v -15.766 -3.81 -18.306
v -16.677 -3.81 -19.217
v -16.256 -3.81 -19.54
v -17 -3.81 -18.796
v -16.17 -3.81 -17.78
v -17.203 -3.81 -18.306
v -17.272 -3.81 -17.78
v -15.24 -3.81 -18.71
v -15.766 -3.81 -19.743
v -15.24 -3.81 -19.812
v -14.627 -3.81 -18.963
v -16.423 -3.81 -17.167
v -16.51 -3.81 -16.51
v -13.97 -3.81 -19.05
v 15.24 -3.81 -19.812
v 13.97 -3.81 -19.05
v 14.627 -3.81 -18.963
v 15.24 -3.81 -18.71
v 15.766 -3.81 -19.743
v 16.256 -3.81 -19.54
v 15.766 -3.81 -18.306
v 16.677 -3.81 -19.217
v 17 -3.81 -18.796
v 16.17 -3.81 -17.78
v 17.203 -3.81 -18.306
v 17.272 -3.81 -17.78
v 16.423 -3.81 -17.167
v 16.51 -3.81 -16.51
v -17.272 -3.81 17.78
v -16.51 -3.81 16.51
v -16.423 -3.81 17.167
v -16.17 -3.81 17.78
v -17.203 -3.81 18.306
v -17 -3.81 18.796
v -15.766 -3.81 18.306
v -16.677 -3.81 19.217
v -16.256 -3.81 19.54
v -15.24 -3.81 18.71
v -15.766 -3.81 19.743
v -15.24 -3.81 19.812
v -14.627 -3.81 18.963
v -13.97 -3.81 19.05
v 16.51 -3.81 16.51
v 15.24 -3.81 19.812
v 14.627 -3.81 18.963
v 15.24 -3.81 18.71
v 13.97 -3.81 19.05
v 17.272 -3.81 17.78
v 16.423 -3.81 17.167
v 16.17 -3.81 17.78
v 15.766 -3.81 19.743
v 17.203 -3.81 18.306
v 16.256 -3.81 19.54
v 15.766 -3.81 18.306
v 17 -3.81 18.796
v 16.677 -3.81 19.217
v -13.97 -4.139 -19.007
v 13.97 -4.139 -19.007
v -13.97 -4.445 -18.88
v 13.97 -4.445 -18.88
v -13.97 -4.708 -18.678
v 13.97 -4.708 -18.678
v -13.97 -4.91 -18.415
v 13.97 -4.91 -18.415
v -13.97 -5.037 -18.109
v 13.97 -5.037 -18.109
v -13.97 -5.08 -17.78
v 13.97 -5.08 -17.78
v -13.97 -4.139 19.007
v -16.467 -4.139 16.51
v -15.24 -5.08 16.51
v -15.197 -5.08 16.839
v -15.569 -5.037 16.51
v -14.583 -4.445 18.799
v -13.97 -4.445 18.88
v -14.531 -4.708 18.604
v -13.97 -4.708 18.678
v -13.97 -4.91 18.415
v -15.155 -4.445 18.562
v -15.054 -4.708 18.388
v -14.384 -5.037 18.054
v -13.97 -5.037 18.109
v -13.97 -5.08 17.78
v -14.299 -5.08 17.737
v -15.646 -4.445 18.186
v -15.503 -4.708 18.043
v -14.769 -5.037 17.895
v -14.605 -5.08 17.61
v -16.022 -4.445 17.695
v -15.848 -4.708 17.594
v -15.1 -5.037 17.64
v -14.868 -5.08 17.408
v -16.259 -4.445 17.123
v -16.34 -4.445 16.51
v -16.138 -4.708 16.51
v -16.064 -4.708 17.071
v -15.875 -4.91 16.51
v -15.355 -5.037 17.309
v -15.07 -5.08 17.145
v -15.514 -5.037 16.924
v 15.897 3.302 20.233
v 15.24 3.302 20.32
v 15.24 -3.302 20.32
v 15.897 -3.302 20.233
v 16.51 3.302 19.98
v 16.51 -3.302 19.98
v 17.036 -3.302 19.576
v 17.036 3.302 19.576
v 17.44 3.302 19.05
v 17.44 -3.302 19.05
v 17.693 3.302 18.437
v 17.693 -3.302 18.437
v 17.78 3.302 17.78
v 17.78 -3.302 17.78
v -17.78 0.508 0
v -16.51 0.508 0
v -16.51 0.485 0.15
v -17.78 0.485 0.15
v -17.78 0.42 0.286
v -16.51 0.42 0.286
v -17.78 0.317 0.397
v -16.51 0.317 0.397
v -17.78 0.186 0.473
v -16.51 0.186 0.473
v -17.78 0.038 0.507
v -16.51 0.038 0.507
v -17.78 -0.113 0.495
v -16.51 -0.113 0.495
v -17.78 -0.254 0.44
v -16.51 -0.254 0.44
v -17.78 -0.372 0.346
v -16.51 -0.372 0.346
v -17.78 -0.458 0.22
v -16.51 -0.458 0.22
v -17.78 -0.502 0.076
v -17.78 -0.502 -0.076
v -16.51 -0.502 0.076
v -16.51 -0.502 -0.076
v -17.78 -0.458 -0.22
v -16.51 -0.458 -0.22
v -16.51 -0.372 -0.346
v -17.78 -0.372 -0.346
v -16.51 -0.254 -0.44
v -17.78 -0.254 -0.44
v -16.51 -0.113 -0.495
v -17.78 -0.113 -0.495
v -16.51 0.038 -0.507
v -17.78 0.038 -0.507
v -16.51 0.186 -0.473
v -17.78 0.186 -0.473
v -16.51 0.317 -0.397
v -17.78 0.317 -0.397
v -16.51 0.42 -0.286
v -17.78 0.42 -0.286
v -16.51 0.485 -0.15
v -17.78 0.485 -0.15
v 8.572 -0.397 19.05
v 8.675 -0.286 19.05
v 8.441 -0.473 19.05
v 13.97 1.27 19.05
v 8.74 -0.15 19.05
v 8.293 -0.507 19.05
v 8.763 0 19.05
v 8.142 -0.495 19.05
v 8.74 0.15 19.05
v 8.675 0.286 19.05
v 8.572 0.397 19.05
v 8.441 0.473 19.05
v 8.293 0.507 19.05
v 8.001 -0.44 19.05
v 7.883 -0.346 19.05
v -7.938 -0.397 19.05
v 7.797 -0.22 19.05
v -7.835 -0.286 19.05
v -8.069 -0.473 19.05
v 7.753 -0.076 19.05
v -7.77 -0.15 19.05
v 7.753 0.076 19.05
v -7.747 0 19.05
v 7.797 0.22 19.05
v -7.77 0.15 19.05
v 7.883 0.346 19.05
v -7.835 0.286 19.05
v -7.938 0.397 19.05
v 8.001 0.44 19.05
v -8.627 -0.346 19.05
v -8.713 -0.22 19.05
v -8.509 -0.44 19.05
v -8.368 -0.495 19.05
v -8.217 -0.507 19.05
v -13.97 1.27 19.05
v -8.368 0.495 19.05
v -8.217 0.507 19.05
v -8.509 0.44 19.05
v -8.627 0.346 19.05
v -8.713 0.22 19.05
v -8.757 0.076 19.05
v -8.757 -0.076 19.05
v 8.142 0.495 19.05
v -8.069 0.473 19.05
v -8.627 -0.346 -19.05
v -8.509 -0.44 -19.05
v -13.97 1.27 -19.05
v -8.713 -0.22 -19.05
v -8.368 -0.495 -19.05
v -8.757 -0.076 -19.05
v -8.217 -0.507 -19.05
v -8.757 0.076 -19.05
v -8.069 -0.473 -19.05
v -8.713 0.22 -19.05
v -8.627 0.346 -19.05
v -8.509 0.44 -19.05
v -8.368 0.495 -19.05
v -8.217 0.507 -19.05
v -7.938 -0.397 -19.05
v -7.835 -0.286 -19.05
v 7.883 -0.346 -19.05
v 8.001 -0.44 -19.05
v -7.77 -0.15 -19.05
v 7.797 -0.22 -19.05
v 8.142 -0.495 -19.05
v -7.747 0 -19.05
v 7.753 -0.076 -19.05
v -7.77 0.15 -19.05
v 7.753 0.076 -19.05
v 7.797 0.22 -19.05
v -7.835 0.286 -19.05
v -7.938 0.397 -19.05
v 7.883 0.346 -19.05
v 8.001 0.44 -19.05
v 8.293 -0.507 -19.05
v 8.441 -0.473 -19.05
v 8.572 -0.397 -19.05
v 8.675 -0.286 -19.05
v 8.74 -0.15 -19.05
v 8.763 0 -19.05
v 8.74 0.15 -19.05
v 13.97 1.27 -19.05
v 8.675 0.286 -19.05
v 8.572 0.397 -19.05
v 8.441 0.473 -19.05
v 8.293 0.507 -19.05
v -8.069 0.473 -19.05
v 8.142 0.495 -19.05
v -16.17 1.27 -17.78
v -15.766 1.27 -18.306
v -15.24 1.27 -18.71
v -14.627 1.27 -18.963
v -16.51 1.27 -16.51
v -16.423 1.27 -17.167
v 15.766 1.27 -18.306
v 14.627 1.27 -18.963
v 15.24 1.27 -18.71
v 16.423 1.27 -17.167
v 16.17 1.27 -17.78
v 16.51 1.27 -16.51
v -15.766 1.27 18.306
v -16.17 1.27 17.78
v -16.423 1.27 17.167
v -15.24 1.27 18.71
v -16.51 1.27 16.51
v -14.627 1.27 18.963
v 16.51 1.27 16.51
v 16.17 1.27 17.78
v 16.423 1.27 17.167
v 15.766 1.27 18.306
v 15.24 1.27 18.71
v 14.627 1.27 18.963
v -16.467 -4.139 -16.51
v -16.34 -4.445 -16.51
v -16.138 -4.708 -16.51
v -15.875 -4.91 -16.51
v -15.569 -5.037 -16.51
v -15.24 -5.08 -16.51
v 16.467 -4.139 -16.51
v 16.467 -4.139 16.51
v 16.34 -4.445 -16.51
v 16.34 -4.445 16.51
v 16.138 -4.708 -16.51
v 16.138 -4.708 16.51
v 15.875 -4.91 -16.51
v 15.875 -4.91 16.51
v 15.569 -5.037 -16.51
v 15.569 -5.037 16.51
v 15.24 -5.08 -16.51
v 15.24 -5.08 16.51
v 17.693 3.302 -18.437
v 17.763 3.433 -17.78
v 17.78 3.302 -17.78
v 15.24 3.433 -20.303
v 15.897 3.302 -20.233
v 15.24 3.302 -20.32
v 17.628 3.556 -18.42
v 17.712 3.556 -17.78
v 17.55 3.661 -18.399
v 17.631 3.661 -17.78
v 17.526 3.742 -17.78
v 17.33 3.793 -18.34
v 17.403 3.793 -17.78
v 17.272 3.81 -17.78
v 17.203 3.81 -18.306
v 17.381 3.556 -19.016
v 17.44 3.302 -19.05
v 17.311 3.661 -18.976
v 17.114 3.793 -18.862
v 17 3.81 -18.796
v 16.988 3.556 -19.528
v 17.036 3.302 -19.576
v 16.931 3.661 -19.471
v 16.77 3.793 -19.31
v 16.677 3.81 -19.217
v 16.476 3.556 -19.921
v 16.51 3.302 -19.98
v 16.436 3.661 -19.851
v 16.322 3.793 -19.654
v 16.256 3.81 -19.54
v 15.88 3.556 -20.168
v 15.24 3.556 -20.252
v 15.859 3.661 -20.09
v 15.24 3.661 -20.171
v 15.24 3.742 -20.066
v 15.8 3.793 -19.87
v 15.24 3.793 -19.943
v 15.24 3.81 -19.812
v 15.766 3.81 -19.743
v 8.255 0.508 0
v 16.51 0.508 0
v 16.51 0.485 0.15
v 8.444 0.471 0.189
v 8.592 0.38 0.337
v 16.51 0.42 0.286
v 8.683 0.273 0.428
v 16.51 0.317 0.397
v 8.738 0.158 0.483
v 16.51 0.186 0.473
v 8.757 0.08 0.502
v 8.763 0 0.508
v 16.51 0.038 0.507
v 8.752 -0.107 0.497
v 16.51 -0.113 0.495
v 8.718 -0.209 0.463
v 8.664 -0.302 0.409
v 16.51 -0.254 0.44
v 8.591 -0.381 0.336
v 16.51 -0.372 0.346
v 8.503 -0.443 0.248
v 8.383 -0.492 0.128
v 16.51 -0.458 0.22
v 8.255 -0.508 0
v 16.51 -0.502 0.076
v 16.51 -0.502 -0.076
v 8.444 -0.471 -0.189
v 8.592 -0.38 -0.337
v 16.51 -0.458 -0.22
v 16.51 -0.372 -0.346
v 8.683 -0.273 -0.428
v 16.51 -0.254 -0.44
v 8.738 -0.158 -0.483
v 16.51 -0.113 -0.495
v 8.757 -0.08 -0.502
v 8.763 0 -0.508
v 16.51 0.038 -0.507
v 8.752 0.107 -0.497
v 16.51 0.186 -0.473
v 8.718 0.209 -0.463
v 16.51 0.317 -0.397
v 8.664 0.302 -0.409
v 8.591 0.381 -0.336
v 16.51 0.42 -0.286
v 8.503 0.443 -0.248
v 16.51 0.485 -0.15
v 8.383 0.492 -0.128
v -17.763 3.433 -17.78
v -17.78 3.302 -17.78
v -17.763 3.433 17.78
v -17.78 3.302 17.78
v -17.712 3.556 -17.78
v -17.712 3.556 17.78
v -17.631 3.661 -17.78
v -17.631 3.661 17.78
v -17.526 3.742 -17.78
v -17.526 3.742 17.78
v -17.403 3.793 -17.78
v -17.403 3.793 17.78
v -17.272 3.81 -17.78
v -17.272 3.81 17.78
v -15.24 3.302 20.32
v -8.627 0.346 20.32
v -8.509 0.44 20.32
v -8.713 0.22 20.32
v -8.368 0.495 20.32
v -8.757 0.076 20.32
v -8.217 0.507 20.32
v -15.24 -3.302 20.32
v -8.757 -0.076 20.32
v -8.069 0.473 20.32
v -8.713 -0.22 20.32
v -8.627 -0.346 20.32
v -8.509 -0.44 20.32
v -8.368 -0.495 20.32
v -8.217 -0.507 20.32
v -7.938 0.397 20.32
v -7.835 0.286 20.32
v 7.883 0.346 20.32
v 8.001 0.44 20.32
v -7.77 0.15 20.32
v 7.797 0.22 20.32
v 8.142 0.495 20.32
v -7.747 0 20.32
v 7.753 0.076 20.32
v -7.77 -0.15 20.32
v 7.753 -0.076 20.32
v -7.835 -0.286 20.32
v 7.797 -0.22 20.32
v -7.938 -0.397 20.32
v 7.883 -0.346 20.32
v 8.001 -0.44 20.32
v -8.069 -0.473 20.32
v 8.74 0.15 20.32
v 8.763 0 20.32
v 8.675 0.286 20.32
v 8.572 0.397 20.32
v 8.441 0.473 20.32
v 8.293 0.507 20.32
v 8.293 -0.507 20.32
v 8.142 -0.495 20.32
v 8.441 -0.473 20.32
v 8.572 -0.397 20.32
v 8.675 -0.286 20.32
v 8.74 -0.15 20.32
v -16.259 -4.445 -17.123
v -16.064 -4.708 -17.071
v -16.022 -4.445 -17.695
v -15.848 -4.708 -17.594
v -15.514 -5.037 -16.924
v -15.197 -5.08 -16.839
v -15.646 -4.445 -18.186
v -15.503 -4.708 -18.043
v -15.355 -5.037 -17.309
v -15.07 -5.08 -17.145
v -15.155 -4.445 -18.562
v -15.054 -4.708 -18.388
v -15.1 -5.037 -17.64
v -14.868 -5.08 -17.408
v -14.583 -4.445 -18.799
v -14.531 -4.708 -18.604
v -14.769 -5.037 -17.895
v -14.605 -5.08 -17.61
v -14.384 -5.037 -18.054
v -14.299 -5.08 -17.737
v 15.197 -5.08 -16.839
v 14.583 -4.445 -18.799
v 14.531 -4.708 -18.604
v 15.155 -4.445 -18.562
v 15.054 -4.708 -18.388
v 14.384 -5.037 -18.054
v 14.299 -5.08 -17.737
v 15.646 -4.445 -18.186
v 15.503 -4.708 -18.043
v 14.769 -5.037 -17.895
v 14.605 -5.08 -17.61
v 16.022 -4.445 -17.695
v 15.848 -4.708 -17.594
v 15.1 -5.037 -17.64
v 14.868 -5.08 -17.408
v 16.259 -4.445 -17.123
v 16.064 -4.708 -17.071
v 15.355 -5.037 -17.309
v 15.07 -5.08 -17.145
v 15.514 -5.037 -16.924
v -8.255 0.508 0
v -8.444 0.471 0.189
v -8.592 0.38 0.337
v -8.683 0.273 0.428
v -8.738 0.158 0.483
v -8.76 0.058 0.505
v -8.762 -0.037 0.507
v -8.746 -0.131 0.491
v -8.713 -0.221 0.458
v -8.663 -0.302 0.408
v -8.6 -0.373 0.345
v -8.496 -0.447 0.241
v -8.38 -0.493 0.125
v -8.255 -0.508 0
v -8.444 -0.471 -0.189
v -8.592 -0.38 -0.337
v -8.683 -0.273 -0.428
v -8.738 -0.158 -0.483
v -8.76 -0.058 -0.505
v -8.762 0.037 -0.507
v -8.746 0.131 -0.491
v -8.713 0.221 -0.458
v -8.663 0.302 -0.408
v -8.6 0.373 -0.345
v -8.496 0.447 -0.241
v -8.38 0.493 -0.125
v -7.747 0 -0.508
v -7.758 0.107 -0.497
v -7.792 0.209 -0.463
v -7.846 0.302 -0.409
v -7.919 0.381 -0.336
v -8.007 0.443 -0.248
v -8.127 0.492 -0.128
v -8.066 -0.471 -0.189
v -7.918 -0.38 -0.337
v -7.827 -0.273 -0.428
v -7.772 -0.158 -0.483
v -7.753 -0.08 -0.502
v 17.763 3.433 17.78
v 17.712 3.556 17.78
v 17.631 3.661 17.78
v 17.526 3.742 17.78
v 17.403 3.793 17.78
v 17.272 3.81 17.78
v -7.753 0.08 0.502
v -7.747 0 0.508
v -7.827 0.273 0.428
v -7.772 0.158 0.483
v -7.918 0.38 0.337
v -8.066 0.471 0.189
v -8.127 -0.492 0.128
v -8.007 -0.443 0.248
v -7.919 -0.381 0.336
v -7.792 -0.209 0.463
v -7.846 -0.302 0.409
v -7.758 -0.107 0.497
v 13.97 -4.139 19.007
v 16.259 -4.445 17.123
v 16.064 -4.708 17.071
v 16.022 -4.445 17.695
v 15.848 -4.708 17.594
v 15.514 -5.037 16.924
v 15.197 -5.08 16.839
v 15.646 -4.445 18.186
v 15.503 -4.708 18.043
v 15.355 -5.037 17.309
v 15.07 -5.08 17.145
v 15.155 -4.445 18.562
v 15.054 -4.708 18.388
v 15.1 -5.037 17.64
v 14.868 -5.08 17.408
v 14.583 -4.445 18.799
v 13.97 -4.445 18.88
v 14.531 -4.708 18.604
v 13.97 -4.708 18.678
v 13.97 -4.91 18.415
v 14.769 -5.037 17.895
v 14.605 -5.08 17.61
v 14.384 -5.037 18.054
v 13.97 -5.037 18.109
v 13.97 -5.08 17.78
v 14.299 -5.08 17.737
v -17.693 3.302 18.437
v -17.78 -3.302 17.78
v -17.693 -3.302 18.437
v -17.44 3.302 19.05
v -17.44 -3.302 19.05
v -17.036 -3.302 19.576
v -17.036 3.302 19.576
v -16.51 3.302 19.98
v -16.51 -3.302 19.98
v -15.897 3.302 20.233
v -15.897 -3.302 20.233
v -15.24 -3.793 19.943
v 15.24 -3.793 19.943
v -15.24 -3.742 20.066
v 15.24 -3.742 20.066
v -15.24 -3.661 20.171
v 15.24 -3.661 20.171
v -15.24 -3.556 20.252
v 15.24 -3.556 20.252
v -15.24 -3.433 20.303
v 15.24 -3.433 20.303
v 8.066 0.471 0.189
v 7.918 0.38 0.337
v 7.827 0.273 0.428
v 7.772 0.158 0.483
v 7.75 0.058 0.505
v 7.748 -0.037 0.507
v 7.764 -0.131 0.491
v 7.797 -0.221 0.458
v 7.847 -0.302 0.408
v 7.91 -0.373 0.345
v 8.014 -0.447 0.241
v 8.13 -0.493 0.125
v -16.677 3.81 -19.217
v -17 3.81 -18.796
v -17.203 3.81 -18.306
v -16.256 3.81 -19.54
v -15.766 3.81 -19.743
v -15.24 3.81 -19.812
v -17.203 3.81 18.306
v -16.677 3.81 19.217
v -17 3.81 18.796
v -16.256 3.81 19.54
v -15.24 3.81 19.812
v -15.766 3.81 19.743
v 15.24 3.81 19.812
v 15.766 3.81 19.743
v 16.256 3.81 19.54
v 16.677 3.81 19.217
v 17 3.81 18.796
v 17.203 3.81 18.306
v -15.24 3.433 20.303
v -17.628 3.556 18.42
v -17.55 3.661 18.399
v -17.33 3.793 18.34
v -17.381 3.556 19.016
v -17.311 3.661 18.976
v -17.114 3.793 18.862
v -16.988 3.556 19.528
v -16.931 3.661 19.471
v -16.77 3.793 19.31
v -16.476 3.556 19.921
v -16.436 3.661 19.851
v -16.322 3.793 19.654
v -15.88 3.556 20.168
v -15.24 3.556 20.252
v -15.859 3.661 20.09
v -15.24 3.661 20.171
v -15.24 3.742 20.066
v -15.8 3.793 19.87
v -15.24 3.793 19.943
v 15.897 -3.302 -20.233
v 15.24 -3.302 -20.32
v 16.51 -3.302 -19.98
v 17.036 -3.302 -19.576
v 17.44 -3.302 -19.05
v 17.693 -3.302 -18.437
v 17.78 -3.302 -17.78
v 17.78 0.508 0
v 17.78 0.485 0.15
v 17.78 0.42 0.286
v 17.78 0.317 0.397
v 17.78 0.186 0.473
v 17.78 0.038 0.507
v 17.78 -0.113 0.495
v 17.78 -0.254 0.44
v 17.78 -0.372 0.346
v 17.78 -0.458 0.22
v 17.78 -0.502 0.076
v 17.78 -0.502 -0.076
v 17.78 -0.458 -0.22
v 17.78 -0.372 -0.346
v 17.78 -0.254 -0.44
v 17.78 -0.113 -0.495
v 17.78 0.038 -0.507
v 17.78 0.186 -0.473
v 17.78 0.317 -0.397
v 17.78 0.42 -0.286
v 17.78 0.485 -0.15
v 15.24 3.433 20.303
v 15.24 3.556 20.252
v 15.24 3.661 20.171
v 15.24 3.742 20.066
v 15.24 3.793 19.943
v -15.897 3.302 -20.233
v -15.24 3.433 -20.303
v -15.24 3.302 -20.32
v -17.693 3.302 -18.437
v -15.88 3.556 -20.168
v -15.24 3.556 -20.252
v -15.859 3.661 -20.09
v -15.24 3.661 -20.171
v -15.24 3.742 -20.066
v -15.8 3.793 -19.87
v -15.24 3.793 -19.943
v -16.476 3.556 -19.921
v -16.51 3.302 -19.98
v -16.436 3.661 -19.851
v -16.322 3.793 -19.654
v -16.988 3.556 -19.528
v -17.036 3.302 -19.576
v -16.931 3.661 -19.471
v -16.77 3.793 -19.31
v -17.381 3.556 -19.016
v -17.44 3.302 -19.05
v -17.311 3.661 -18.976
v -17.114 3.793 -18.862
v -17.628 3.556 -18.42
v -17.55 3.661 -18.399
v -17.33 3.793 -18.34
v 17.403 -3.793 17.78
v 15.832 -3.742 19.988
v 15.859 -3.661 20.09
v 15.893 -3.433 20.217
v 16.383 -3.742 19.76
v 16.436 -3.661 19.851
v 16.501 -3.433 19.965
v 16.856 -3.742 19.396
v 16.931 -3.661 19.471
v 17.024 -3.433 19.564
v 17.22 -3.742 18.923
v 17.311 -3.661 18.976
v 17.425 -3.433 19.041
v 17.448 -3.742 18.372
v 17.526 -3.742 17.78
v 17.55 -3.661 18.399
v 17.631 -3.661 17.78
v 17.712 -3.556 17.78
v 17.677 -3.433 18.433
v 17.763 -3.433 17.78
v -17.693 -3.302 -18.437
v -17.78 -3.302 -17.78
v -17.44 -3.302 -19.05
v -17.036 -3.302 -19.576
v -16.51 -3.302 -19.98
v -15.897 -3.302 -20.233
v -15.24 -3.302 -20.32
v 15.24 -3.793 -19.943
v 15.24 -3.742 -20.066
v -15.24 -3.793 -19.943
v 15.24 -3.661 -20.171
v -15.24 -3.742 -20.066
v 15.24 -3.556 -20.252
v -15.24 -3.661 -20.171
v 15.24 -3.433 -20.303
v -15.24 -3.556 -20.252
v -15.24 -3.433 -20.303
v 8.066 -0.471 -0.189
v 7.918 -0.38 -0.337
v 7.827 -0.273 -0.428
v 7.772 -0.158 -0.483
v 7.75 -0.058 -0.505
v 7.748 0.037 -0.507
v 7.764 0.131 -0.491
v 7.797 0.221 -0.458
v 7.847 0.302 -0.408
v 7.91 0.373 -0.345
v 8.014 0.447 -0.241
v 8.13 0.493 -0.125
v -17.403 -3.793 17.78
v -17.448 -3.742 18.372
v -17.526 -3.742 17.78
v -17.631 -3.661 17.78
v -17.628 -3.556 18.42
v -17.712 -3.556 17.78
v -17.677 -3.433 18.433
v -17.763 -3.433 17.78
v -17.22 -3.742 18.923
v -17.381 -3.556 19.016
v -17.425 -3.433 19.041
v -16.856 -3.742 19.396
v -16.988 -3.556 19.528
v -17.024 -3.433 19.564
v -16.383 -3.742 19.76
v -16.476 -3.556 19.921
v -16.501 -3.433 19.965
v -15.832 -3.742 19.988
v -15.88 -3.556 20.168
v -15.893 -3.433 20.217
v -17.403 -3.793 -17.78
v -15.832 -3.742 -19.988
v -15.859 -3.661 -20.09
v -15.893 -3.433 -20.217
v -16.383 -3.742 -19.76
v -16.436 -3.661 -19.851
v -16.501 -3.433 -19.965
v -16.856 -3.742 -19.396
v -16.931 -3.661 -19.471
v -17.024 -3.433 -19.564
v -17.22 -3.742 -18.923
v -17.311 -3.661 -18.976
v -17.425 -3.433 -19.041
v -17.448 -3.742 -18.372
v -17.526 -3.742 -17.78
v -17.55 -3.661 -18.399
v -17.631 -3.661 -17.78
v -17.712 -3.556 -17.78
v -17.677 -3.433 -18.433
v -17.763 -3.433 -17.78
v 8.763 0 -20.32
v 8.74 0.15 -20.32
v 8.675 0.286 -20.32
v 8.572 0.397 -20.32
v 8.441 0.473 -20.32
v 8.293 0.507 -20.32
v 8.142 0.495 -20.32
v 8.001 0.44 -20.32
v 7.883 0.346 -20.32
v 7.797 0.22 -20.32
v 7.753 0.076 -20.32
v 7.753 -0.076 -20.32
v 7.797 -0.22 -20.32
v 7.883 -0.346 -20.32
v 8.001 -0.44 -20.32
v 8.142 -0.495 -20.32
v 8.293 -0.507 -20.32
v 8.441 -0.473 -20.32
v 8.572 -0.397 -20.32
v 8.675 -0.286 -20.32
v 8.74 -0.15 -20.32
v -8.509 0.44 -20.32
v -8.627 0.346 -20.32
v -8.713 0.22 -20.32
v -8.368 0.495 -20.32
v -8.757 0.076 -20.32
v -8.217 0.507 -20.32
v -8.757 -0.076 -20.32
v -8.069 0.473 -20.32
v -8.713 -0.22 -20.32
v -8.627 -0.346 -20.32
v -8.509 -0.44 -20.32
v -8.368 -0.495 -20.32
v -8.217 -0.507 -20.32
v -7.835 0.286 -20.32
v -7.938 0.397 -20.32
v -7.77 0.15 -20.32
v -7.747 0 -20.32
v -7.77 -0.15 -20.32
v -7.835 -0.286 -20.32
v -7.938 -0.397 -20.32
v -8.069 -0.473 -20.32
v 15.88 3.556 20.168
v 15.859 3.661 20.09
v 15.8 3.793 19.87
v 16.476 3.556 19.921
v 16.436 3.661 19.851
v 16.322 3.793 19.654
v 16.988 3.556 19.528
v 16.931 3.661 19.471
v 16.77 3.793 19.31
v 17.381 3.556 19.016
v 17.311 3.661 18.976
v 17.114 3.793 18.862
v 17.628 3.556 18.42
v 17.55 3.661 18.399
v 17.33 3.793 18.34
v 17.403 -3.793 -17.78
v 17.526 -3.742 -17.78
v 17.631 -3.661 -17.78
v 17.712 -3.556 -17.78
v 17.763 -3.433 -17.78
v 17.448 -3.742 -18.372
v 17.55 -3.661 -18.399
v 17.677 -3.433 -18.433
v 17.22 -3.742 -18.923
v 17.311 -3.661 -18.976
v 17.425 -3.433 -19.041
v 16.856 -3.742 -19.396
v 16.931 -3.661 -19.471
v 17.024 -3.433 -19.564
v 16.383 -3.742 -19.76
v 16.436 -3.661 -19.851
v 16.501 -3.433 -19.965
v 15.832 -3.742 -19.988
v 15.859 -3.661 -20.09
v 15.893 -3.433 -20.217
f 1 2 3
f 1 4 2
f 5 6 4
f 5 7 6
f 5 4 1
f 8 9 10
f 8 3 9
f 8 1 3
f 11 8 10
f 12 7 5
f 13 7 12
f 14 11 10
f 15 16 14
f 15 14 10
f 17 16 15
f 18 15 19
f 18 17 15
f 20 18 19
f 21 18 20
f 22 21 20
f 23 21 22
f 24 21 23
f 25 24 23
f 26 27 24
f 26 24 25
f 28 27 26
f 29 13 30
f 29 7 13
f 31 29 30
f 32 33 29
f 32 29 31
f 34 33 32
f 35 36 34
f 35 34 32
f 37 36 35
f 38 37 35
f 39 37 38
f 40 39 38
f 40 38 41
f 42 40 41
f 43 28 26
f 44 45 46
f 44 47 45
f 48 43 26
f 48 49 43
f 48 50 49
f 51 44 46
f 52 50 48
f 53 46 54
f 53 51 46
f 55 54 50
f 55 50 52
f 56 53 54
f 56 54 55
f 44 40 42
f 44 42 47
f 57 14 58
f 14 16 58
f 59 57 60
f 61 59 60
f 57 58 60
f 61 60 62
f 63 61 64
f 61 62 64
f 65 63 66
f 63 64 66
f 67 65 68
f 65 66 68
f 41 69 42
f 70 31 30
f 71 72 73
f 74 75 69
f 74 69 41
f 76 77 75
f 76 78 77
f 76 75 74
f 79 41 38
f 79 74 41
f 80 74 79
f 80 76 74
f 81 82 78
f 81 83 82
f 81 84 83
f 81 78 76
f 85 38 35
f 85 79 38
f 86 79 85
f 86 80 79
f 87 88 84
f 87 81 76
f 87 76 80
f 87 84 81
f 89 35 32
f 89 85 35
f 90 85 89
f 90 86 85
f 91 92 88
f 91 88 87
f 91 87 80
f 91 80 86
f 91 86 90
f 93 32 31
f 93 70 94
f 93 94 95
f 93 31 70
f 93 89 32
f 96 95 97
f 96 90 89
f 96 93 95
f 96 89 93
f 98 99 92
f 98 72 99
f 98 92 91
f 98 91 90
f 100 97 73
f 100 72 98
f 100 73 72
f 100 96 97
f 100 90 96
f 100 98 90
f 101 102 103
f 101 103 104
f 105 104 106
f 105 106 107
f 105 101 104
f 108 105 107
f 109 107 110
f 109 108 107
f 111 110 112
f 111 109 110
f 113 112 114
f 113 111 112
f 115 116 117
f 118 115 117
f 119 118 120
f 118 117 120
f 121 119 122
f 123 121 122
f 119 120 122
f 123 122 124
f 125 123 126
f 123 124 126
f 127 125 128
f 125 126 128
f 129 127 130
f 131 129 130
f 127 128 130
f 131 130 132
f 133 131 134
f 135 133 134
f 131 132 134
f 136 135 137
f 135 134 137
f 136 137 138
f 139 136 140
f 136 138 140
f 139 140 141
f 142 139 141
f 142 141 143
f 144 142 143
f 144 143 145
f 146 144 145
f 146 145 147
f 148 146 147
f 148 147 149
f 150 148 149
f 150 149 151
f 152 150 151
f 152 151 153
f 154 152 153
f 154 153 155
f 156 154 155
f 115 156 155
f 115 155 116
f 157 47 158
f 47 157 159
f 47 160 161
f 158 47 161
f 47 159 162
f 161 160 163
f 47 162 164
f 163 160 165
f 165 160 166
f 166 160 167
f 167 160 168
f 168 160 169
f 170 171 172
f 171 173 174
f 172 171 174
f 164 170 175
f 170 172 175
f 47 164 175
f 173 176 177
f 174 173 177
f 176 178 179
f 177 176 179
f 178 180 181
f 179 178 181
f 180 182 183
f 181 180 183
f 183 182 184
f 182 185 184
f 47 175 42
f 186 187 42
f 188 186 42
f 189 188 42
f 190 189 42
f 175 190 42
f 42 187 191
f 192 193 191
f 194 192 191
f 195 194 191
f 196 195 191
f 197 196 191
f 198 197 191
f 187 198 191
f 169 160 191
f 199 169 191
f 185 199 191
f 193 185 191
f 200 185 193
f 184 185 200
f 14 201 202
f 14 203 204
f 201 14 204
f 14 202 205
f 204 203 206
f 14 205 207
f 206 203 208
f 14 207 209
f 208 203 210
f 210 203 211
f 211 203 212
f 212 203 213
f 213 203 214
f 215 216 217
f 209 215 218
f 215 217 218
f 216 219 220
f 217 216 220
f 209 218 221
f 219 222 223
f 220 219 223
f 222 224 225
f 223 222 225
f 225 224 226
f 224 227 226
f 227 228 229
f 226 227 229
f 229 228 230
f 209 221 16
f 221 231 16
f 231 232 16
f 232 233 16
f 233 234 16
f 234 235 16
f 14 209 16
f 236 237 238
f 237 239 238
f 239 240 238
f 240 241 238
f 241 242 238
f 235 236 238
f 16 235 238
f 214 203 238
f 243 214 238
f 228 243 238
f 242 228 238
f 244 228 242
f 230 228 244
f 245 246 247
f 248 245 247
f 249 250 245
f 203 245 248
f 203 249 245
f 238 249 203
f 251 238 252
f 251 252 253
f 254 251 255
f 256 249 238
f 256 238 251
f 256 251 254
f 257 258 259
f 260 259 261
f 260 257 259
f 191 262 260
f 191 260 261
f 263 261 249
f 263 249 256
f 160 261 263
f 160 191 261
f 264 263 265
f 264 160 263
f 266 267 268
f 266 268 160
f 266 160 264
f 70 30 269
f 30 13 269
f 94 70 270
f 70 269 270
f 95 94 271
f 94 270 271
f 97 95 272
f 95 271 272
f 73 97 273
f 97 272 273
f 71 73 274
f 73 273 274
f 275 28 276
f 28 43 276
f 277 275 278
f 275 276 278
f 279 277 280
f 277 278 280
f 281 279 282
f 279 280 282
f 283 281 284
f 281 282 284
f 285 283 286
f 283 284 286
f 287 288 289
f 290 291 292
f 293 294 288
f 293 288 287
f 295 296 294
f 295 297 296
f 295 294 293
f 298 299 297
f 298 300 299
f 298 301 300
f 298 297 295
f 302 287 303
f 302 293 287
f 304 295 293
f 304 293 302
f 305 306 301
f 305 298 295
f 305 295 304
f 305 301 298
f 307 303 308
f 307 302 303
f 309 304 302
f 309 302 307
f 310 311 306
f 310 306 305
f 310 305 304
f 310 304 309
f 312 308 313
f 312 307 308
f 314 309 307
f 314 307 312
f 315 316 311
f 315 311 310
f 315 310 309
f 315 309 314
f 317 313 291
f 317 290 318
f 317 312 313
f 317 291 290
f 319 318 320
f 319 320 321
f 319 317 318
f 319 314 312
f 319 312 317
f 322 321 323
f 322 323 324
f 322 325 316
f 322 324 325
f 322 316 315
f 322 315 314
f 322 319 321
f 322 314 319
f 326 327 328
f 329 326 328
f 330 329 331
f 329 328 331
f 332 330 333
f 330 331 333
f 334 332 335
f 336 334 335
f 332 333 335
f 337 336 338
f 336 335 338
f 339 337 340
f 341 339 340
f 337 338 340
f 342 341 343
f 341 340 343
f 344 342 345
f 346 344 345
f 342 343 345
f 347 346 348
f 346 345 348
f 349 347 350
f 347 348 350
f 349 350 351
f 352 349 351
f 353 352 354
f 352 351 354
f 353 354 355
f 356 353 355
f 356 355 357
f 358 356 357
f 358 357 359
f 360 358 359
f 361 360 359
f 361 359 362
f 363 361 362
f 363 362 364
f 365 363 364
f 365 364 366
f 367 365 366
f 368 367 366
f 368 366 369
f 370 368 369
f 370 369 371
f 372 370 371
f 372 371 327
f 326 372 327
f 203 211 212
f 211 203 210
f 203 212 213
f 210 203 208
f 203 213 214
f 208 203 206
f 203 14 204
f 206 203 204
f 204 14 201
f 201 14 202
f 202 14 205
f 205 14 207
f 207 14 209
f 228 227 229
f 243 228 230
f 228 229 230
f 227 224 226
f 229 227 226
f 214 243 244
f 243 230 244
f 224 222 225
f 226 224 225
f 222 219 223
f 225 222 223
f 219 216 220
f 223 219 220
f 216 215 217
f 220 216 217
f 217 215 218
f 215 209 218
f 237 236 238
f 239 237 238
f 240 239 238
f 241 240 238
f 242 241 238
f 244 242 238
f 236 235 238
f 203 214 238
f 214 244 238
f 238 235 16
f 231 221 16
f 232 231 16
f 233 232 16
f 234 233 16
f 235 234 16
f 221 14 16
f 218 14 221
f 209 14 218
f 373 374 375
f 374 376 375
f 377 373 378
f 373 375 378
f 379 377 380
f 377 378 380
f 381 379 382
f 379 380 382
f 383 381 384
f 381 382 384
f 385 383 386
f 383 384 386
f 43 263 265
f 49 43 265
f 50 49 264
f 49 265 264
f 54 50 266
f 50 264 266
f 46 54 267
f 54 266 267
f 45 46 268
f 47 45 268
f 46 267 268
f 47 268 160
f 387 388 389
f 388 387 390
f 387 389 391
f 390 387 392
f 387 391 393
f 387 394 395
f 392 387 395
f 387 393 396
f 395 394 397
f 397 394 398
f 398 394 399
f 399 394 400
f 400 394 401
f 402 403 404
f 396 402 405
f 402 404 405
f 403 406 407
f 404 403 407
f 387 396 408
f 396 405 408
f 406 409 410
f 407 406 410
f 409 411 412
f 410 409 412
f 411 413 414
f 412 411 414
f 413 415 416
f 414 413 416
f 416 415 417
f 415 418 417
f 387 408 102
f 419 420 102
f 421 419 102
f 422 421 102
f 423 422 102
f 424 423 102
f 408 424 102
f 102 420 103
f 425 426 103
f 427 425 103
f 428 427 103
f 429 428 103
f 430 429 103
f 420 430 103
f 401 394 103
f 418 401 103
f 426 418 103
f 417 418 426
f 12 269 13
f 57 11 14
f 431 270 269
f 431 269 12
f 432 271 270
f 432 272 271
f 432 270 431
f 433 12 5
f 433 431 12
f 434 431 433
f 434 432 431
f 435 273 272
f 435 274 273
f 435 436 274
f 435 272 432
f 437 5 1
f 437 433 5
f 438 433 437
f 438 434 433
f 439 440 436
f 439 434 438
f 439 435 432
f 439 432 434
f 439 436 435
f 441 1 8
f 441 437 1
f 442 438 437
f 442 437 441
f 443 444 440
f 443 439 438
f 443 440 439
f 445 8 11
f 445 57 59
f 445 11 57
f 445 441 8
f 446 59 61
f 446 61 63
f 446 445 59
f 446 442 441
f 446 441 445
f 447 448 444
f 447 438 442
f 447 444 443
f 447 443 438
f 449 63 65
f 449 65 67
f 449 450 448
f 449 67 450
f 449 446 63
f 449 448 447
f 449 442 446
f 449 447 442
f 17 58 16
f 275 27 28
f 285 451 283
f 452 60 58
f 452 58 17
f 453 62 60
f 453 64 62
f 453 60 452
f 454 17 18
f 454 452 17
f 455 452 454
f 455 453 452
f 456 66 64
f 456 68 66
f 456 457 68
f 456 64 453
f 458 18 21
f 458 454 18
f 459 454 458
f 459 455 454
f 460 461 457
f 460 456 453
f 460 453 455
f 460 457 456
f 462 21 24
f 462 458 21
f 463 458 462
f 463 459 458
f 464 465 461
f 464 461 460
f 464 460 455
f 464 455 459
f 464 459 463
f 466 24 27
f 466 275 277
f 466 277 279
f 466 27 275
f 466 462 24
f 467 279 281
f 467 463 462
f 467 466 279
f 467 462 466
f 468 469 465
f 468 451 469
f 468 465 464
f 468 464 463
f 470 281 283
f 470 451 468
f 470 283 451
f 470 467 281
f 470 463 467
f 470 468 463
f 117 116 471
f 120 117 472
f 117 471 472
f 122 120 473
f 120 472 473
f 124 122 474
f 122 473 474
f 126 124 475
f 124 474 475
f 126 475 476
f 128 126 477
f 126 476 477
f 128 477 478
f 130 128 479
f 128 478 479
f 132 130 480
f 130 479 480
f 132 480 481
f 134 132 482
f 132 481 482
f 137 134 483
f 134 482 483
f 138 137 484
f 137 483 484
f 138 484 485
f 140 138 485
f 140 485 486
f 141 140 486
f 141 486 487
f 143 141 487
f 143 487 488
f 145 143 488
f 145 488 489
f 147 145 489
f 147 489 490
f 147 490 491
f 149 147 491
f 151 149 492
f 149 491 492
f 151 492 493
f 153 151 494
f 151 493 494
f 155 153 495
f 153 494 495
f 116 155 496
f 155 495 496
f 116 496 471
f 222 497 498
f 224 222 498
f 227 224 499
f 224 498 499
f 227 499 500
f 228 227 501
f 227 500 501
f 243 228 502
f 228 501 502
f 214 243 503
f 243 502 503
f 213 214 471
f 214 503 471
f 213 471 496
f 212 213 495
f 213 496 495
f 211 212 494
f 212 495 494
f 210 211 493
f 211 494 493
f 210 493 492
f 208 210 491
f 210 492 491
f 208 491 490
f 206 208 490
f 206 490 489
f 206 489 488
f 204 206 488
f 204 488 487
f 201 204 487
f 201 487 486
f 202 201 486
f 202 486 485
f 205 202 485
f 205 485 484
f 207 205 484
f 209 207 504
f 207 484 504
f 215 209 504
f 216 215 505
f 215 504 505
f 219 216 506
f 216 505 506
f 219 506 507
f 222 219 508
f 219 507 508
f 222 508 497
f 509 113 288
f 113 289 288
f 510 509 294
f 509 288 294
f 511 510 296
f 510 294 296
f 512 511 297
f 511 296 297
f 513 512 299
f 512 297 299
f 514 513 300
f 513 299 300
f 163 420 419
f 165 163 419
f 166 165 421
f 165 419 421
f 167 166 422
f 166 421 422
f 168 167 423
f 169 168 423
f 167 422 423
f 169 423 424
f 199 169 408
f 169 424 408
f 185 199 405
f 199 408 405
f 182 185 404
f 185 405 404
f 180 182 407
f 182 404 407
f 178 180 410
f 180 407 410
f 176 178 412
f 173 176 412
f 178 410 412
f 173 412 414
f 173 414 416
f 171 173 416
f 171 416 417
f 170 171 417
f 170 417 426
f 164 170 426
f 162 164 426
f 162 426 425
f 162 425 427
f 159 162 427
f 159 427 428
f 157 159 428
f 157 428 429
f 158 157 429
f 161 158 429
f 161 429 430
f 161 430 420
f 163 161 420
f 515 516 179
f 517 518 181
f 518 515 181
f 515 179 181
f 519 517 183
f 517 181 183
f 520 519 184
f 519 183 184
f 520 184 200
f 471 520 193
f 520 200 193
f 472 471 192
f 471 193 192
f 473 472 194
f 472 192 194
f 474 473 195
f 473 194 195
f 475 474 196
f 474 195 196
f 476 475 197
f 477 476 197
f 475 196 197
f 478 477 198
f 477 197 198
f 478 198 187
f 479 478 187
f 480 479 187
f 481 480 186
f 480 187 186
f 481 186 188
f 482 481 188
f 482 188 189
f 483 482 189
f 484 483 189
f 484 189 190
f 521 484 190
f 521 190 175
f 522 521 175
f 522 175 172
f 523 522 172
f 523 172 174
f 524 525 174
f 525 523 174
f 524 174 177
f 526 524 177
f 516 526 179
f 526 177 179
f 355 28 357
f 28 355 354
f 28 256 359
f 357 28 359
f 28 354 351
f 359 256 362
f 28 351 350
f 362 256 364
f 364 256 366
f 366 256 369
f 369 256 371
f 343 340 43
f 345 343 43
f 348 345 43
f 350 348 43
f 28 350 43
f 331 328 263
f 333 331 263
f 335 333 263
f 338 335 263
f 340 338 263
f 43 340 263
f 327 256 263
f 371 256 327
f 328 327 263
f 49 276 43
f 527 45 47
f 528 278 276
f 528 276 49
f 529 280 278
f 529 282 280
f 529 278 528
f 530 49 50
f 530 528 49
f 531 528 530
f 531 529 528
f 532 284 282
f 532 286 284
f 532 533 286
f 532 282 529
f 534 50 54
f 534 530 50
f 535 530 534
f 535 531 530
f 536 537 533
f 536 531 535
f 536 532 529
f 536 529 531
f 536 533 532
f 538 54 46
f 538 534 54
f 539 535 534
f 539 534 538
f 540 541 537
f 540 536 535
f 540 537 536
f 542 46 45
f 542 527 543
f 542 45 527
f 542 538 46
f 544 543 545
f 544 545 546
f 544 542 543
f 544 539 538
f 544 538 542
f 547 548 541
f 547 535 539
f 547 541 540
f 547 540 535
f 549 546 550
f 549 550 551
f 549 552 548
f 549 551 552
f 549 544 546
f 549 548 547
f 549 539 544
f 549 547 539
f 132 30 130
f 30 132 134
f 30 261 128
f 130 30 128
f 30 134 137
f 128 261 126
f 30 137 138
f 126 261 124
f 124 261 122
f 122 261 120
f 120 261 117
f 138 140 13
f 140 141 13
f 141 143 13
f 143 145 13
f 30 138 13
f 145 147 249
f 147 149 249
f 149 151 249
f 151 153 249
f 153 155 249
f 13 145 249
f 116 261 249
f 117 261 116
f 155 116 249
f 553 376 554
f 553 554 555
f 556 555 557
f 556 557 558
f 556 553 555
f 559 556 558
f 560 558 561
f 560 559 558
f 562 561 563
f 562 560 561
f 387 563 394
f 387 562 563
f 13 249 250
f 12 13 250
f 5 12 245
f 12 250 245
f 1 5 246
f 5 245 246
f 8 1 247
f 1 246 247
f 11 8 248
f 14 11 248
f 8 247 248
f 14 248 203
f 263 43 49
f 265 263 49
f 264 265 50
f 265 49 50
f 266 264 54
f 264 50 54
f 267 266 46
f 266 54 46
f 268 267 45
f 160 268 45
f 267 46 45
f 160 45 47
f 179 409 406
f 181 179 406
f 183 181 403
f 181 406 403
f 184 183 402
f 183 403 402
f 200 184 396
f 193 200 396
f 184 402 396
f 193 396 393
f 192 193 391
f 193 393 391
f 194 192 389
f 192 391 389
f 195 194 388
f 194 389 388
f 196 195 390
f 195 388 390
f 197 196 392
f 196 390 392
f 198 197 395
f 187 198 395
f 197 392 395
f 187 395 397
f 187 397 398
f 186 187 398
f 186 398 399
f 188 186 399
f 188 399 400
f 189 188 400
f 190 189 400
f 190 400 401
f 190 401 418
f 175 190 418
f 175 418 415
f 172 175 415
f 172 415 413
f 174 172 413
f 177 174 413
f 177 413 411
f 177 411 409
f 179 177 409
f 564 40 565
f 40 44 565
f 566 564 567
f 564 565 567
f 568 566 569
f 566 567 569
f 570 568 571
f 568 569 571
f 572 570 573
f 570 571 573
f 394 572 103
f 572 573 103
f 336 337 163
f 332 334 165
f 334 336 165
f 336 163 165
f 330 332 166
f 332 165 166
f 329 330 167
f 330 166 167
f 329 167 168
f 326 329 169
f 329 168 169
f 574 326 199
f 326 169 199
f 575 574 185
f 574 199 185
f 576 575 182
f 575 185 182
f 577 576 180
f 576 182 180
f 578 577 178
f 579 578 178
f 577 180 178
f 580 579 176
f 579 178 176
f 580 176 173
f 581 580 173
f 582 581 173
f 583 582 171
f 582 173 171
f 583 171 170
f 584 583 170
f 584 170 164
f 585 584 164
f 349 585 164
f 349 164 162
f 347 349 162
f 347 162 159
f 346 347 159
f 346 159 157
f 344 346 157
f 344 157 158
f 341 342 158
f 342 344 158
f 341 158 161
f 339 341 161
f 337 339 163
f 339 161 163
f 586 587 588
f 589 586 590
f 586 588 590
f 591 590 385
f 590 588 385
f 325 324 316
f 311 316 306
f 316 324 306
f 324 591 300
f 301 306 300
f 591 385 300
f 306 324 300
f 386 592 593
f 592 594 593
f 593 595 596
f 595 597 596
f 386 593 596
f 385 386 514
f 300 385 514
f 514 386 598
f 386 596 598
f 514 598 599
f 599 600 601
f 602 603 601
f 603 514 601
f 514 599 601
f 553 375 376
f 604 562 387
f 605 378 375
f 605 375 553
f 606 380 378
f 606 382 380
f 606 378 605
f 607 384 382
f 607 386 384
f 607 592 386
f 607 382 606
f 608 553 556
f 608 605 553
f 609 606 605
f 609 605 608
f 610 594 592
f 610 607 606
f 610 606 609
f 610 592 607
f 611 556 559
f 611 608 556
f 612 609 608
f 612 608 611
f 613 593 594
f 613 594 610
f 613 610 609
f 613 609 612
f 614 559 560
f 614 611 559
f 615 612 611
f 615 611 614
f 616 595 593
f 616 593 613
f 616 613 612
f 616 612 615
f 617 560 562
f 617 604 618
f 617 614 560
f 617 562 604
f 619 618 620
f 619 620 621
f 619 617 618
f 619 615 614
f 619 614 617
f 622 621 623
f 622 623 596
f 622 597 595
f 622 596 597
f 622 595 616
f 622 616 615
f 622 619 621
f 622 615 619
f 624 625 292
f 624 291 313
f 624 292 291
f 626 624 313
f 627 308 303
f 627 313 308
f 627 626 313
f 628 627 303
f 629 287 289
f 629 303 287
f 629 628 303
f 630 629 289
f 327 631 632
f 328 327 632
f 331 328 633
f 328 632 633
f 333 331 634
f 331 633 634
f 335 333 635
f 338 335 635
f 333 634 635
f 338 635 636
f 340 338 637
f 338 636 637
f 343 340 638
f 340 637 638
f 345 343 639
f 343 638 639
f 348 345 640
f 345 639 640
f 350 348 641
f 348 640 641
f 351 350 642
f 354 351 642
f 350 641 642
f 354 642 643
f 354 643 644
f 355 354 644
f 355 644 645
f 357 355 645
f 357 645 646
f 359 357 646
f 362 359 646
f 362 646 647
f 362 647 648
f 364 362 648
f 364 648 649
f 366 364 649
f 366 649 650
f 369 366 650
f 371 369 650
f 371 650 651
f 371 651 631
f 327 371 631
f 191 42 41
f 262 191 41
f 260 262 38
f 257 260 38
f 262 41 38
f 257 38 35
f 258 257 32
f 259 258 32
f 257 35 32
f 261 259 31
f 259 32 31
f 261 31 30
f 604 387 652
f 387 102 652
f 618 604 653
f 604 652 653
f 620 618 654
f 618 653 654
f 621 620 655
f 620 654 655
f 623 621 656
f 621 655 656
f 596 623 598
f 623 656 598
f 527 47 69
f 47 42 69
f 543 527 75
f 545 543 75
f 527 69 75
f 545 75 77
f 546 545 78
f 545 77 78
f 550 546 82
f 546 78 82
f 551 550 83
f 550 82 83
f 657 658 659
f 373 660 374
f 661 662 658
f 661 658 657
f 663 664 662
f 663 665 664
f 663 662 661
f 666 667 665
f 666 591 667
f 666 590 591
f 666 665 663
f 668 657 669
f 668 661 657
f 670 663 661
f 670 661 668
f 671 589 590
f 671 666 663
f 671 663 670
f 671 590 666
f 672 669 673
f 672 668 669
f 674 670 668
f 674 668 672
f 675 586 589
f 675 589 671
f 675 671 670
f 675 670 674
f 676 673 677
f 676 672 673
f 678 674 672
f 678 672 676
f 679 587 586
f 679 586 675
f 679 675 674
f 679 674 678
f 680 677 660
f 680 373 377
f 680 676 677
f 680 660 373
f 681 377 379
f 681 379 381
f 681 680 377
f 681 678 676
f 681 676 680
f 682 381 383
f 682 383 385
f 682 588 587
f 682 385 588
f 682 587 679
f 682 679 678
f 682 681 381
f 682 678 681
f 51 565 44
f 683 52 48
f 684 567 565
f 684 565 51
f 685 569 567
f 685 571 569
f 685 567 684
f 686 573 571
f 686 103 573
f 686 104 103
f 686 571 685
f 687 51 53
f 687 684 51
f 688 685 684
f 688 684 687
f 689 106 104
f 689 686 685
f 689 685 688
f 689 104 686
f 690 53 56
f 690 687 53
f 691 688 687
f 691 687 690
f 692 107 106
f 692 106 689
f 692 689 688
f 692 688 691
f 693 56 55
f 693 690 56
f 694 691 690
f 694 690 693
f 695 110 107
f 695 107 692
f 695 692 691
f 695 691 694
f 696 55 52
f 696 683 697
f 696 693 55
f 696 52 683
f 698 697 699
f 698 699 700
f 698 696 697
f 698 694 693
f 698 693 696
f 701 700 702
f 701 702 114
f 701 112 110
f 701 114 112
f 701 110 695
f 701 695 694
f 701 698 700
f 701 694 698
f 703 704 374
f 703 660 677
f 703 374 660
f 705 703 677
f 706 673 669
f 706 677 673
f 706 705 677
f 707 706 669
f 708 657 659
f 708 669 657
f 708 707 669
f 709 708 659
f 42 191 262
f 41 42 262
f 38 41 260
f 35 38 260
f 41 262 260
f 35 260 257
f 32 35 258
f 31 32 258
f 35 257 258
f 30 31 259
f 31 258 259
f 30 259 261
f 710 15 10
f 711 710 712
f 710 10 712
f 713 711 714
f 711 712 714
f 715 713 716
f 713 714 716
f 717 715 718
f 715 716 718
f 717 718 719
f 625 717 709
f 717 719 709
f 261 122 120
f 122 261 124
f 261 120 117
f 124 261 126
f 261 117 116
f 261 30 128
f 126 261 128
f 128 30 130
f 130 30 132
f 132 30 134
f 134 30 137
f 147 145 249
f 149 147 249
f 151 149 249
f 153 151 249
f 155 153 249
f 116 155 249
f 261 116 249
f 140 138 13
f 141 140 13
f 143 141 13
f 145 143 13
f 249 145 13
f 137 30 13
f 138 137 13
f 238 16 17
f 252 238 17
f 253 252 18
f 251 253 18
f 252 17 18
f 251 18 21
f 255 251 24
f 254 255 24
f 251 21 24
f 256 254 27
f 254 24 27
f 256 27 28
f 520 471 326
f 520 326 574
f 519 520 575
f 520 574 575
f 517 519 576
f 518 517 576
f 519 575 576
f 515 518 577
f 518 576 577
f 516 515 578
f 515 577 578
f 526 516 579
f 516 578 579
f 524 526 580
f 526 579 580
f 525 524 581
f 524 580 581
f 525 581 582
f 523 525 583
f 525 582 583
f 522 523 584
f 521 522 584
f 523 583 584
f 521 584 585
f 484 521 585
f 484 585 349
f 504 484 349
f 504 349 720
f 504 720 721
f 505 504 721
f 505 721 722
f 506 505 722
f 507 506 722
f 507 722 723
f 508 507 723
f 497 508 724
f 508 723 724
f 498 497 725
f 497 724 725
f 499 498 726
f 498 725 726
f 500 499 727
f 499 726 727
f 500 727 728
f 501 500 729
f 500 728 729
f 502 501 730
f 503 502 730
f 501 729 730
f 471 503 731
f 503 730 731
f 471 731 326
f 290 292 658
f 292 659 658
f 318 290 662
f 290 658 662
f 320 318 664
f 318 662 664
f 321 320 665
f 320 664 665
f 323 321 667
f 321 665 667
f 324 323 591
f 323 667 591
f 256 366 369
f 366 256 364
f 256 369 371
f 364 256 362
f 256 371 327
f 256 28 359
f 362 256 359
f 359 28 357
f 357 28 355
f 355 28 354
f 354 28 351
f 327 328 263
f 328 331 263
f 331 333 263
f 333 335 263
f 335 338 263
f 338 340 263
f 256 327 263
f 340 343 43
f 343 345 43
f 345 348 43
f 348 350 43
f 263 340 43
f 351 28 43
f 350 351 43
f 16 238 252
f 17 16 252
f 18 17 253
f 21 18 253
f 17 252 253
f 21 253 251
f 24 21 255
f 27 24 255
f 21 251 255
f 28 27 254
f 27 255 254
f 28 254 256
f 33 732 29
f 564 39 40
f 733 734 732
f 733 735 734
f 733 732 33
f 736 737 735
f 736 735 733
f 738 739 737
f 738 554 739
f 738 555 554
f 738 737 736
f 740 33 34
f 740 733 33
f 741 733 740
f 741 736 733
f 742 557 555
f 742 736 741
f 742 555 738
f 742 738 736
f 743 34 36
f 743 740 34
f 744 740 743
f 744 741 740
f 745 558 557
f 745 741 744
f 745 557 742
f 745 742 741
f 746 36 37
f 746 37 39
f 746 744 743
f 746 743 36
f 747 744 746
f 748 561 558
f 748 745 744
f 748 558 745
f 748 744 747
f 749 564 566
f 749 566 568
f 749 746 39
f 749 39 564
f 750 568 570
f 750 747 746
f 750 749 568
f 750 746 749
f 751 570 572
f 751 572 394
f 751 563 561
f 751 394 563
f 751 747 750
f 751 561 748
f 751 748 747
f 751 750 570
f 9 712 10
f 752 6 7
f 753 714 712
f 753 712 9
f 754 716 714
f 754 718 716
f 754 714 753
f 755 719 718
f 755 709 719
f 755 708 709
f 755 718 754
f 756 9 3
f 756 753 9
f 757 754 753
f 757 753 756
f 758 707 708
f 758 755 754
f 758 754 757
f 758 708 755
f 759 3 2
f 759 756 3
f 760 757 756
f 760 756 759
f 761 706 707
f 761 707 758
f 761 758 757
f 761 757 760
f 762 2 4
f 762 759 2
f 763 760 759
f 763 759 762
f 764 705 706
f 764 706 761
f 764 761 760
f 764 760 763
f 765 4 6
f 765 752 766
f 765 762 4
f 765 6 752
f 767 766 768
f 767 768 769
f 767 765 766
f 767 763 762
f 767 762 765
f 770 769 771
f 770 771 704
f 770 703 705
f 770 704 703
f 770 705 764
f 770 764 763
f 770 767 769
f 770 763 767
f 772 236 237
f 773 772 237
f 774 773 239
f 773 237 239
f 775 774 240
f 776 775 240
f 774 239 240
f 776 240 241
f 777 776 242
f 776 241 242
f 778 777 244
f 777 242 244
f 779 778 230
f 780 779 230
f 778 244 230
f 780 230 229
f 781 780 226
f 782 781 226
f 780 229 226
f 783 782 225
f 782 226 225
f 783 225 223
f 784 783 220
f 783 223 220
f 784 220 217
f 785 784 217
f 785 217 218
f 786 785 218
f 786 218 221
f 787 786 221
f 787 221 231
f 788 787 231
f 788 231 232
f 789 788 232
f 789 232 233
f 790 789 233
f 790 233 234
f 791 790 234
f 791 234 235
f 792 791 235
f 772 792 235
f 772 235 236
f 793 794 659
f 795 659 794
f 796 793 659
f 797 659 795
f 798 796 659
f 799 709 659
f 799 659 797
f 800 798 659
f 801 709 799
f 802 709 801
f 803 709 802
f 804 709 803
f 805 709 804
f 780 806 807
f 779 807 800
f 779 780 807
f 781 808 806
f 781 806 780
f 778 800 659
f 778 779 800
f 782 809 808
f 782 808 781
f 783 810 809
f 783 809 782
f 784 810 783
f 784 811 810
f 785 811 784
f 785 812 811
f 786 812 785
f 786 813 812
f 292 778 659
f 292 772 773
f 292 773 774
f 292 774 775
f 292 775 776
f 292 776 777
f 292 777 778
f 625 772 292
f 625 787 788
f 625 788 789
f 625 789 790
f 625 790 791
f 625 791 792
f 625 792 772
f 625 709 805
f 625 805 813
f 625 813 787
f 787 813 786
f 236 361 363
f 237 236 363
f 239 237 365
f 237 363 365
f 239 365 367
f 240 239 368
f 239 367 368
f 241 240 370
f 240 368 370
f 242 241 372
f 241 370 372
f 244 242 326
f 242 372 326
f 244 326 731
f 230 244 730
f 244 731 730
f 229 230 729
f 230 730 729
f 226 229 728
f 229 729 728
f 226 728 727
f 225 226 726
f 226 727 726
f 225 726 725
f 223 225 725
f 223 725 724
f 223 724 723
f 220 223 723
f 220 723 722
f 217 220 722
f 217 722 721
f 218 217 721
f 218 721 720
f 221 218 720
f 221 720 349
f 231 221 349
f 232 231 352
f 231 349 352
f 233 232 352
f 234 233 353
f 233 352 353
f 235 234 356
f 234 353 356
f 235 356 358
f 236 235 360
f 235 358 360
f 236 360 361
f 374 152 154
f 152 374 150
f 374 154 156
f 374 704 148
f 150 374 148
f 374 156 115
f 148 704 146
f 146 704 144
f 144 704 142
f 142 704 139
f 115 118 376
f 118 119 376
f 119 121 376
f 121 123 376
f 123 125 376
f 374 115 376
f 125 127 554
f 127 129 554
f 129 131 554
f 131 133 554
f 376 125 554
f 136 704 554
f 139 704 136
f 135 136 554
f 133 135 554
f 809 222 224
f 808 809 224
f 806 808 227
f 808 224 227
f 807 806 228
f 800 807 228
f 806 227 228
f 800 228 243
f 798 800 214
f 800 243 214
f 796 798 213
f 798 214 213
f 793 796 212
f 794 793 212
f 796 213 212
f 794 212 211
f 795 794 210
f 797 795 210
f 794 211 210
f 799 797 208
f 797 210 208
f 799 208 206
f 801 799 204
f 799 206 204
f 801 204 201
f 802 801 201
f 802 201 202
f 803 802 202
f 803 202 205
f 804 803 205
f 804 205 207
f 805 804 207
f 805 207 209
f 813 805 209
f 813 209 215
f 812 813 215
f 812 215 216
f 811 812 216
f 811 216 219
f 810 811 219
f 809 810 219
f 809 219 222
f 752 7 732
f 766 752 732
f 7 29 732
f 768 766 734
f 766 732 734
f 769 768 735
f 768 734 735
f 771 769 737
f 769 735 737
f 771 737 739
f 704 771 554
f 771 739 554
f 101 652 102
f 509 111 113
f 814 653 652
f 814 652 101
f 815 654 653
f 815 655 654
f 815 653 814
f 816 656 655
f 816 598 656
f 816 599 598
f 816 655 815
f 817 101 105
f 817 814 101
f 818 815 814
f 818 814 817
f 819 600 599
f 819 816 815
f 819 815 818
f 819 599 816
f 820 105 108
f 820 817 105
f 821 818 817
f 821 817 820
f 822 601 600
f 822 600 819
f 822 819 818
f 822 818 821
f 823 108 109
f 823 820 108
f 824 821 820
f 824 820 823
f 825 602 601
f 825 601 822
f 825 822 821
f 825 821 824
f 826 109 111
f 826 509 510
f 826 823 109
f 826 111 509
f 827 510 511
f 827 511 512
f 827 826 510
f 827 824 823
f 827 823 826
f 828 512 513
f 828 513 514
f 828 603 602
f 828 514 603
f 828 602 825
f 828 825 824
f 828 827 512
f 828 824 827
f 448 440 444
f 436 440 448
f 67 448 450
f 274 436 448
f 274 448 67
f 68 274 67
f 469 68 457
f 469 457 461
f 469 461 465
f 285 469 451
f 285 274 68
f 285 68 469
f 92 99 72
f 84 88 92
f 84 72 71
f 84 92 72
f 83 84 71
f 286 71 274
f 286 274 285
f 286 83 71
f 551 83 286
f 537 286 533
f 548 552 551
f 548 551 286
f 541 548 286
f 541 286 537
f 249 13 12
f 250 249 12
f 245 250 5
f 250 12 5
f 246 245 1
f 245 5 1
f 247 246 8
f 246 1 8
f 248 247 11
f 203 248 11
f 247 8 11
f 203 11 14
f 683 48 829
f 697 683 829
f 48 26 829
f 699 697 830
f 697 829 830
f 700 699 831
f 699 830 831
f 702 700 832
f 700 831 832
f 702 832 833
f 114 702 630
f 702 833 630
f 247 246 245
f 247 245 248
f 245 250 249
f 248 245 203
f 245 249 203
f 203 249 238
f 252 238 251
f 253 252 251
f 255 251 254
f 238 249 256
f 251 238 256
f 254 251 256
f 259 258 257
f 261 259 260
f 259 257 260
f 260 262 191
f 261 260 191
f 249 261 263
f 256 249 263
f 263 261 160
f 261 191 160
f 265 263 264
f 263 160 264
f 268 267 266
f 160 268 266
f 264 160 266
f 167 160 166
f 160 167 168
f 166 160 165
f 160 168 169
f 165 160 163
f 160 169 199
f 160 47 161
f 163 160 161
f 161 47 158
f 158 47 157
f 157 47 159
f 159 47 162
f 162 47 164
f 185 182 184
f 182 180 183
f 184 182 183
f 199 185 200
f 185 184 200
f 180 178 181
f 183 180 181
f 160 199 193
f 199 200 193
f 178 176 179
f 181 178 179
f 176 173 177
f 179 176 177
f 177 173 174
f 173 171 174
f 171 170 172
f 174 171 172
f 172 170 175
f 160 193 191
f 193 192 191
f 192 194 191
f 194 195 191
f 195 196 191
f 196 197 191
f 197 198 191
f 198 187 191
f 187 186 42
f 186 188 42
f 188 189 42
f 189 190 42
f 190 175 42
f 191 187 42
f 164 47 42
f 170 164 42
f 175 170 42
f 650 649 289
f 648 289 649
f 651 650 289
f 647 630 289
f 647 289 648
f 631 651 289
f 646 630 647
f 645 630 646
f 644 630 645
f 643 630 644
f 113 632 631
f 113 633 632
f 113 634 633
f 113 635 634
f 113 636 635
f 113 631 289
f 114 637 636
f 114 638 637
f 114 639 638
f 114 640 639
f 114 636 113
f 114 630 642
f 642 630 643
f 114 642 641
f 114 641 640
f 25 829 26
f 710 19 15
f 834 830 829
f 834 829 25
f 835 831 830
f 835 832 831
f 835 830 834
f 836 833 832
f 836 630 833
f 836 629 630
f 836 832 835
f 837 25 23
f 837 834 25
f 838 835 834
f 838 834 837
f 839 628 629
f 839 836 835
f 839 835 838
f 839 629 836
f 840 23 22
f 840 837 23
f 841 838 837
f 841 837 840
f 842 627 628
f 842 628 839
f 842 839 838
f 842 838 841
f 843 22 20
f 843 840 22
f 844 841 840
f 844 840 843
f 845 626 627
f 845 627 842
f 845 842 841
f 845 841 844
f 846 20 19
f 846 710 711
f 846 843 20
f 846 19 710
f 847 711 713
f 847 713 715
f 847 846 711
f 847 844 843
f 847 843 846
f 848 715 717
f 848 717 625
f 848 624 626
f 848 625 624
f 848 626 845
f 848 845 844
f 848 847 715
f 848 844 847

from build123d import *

# Parameters (mm, degrees)
F0_W          = 35.56
F0_H          = 40.64
F1_DEPTH      = 3.81
F1_DEPTH_BACK = 3.81
F3_DEPTH      = 5.08
F4_DEPTH      = 6.35
F5_R          = 2.54
F6_R          = 0.508
F7_R          = 1.27
F8_R          = 0.508
F9_DEPTH      = 35.561
F10_R         = 0.508
F11_DEPTH     = 40.641


with BuildPart() as f1:
    # F0 (on Front) → F1 (new body, two sides)
    with BuildSketch(Plane.XZ) as f1_sk:
        Rectangle(F0_W, F0_H)
    extrude(amount=F1_DEPTH)
    extrude(f1_sk.sketch, amount=-F1_DEPTH_BACK)

    # F2 (on face) → F3 (cut)
    with BuildSketch(Plane.XZ.offset(3.81)):
        with BuildLine():
            Line((13.97, 19.05), (-13.97, 19.05))
            ThreePointArc((-13.97, 19.05), (-15.7660512242, 18.3060512242), (-16.51, 16.51))
            Line((-16.51, 16.51), (-16.51, -16.51))
            ThreePointArc((-16.51, -16.51), (-15.7660512242, -18.3060512242), (-13.97, -19.05))
            Line((-13.97, -19.05), (13.97, -19.05))
            ThreePointArc((13.97, -19.05), (15.7660512242, -18.3060512242), (16.51, -16.51))
            Line((16.51, -16.51), (16.51, 16.51))
            ThreePointArc((16.51, 16.51), (15.7660512242, 18.3060512242), (13.97, 19.05))
        make_face()
    extrude(amount=-F3_DEPTH, mode=Mode.SUBTRACT)


with BuildPart() as f4:
    # F4 (new): a face of the model
    f4_faces = [f1.part.faces().sort_by_distance(p)[0] for p in [
        (0, 1.27, 0),
    ]]
    extrude(f4_faces, amount=F4_DEPTH)

    # F7
    f7_edges = [f4.edges().sort_by_distance(p)[0] for p in [
        (0, -5.08, 19.05),
        (-15.766051, -5.08, 18.306051),
        (-16.51, -5.08, 0),
        (-15.766051, -5.08, -18.306051),
        (0, -5.08, -19.05),
        (15.766051, -5.08, -18.306051),
        (16.51, -5.08, 0),
        (15.766051, -5.08, 18.306051),
    ]]
    fillet(f7_edges, radius=F7_R)


with BuildPart() as f1_1:
    add(f1.part)

    # F5
    f5_edges = [f1_1.edges().sort_by_distance(p)[0] for p in [
        (-17.78, 0, 20.32),
        (17.78, 0, 20.32),
        (17.78, 0, -20.32),
        (-17.78, 0, -20.32),
    ]]
    fillet(f5_edges, radius=F5_R)

    # F6
    f6_edges = [f1_1.edges().sort_by_distance(p)[0] for p in [
        (0, -3.81, 20.32),
        (-17.036051, -3.81, 19.576051),
        (-17.78, 3.81, 0),
        (-17.036051, 3.81, 19.576051),
        (-17.036051, 3.81, -19.576051),
        (0, 3.81, 20.32),
        (0, 3.81, -20.32),
        (17.036051, 3.81, 19.576051),
        (17.036051, 3.81, -19.576051),
        (17.78, 3.81, 0),
    ]]
    fillet(f6_edges, radius=F6_R)


with BuildPart() as f9_tool:
    # F8 (on face) → F9 (new body, through all)
    with BuildSketch(Plane.YZ.offset(17.78)):
        Circle(F8_R)
    extrude(amount=-F9_DEPTH)


with BuildPart() as f1_2:
    add(f1_1.part)

    # F9: cut by f9_tool
    add(f9_tool.part, mode=Mode.SUBTRACT)


with BuildPart() as f4_1:
    add(f4.part)

    # F9: cut by f9_tool
    add(f9_tool.part, mode=Mode.SUBTRACT)


with BuildPart() as f11_tool:
    # F10 (on face) → F11 (new body, through all)
    with BuildSketch(Plane.XY.offset(20.32)):
        with Locations((-8.255, 0)):
            Circle(F10_R)
        with Locations((8.255, 0)):
            Circle(F10_R)
    extrude(amount=-F11_DEPTH)


with BuildPart() as f1_3:
    add(f1_2.part)

    # F11: cut by f11_tool
    add(f11_tool.part, mode=Mode.SUBTRACT)


with BuildPart() as f4_2:
    add(f4_1.part)

    # F11: cut by f11_tool
    add(f11_tool.part, mode=Mode.SUBTRACT)


solid = Compound([f1_3.part, f4_2.part])
